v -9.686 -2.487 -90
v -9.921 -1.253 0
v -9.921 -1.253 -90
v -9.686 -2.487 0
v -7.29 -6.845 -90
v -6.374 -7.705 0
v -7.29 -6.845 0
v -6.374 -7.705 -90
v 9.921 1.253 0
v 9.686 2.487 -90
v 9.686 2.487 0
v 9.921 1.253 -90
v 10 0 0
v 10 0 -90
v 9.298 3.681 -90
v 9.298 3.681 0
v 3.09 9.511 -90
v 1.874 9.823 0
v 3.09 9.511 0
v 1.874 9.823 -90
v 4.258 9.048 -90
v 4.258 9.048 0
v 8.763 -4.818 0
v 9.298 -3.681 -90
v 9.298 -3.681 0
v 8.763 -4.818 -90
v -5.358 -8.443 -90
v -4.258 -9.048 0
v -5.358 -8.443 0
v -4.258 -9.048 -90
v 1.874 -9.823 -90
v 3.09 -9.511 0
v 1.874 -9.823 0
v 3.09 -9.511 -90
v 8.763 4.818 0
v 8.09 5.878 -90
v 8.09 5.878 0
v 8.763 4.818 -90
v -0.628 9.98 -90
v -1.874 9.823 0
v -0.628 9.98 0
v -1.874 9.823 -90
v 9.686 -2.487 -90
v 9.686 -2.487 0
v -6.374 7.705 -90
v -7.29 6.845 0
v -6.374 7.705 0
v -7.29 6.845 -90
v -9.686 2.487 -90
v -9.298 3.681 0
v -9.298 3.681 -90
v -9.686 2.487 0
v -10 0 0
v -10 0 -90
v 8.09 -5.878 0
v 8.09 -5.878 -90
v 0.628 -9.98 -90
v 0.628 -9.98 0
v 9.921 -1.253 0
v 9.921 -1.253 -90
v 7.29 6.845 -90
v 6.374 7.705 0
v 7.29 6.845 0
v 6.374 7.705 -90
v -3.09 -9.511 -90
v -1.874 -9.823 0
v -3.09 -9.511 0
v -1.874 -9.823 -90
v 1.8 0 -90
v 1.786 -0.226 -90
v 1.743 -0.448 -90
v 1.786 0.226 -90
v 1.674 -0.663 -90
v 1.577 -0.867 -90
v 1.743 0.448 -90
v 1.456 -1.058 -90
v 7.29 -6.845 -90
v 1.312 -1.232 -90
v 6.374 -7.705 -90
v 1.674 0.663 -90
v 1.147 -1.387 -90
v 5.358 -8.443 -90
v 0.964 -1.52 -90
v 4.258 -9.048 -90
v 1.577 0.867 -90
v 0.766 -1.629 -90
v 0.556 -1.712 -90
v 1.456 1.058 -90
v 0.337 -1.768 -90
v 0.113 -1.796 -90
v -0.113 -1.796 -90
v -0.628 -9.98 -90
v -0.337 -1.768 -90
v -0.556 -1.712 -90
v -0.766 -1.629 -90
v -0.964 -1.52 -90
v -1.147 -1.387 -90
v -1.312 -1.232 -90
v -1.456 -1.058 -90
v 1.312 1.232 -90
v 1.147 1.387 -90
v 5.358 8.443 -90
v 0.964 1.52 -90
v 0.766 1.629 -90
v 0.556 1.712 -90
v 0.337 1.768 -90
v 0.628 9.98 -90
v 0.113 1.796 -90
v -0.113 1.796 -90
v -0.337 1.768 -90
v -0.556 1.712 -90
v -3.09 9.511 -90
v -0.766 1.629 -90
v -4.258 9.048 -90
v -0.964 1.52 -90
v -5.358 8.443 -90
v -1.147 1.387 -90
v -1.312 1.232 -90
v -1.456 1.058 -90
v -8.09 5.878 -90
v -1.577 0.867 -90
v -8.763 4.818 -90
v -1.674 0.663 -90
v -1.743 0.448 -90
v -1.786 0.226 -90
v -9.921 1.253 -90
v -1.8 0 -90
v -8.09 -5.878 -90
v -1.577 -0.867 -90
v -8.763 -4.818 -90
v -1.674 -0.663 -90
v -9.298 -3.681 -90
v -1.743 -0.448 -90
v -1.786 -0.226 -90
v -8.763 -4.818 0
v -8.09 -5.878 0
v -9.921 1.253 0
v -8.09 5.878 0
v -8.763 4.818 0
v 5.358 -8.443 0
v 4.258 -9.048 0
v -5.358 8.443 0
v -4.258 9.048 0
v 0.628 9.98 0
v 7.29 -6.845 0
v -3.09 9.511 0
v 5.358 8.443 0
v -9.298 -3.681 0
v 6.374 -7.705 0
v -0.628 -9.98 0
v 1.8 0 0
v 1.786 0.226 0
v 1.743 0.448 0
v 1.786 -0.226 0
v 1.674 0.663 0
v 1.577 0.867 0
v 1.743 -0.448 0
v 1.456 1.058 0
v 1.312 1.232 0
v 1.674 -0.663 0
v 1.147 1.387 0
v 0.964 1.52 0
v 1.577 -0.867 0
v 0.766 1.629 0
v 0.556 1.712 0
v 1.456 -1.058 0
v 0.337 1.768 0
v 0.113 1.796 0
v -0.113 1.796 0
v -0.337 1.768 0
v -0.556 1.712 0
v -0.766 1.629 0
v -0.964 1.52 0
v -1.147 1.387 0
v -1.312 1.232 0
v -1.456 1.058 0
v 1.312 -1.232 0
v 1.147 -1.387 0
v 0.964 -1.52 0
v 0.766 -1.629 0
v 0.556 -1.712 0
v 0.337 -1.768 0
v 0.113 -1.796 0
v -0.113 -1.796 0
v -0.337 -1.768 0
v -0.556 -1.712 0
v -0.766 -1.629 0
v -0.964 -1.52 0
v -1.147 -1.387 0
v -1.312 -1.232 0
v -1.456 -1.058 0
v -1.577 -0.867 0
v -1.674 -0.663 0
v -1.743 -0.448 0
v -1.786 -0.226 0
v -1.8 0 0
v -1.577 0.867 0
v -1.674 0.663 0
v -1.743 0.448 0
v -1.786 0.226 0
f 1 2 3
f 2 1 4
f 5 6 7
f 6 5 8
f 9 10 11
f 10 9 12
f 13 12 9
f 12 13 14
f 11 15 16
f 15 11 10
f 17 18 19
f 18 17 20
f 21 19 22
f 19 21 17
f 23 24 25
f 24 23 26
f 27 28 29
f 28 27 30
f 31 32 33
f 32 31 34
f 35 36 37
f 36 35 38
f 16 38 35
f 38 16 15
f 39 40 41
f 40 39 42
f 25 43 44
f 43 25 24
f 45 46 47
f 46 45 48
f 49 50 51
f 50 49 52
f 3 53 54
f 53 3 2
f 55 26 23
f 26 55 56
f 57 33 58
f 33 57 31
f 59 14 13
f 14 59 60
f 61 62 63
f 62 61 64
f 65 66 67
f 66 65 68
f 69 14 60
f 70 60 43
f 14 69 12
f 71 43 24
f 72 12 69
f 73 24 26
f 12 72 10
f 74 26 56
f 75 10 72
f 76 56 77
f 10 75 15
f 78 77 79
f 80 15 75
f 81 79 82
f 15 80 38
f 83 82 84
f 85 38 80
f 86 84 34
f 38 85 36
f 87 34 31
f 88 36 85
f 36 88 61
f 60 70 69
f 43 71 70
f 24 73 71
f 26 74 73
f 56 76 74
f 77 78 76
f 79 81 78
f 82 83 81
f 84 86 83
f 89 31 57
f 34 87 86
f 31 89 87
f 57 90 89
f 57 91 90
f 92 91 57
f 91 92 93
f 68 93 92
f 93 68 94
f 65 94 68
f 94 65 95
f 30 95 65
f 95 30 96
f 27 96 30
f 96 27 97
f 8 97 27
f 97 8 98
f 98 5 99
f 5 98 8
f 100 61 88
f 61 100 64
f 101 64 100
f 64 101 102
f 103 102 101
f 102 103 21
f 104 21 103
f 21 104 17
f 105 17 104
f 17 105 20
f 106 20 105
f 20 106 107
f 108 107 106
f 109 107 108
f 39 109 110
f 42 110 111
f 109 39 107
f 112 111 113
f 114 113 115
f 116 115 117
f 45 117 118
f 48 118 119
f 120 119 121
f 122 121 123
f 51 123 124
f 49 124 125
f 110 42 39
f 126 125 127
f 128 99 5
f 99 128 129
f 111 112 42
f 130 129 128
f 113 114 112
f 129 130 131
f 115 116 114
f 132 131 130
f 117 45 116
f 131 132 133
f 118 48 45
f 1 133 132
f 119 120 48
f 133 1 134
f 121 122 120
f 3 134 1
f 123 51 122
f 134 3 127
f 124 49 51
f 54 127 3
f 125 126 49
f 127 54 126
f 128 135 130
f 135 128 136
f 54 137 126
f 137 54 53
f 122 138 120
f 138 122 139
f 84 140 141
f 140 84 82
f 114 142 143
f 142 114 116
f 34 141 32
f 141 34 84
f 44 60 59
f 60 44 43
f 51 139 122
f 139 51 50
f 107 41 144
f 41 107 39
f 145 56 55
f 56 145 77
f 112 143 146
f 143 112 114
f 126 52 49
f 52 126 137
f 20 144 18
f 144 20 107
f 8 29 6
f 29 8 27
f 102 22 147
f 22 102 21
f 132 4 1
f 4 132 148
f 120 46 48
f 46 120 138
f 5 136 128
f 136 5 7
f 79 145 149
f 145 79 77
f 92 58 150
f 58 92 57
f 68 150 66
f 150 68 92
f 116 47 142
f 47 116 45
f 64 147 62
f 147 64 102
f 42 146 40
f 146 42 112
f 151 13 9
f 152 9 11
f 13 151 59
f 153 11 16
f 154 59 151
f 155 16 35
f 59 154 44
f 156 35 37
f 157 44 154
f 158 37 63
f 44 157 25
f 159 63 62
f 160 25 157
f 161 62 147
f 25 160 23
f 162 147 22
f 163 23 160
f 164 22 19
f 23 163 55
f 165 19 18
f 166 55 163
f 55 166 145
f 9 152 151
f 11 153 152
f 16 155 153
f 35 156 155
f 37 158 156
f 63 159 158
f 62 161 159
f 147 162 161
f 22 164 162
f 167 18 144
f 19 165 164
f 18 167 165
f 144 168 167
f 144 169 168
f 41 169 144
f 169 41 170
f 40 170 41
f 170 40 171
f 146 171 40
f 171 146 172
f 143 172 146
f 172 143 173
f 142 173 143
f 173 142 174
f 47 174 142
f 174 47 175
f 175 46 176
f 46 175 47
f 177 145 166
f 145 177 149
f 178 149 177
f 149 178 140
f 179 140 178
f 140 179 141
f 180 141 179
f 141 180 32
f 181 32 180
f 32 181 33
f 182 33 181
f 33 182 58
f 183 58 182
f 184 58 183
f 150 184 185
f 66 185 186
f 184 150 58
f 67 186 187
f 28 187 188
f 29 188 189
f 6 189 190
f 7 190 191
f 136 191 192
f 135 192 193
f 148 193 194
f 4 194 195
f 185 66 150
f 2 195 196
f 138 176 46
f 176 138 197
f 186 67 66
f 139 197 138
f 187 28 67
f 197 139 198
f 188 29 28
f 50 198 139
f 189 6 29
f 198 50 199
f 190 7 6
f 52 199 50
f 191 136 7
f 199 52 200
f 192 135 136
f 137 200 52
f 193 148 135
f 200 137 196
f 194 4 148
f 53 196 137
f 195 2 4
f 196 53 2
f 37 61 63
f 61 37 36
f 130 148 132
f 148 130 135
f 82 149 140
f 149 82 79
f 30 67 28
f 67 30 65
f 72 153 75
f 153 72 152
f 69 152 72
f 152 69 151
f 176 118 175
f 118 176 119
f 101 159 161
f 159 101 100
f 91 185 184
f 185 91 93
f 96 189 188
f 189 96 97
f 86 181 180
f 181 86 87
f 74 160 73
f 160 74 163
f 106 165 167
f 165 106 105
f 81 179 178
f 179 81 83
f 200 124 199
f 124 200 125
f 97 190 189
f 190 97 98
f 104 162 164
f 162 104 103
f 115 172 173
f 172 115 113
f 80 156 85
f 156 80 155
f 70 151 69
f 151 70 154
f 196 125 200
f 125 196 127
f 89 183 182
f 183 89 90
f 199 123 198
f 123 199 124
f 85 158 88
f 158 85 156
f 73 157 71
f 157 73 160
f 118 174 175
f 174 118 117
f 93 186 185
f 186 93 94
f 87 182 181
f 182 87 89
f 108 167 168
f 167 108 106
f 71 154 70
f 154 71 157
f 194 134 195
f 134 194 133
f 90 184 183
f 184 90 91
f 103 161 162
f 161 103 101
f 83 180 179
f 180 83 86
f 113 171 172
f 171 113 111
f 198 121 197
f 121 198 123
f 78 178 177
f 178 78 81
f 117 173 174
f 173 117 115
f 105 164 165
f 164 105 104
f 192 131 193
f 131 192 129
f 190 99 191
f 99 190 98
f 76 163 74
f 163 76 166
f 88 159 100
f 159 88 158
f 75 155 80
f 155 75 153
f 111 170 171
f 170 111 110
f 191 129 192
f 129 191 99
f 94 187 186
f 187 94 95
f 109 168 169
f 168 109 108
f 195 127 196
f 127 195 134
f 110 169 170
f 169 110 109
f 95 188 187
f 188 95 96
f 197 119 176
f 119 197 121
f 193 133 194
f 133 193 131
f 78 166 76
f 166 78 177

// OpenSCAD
$fn = 50;


difference() {
	union() {
		translate(v = [0, 0, -90.0000000000]) {
			cylinder(h = 90, r = 10.0000000000);
		}
		cylinder(h = 0, r = 20.0000000000);
	}
	union() {
		#translate(v = [0, 0, -90]) {
			cylinder(h = 90, r = 1.8000000000);
		}
	}
}
